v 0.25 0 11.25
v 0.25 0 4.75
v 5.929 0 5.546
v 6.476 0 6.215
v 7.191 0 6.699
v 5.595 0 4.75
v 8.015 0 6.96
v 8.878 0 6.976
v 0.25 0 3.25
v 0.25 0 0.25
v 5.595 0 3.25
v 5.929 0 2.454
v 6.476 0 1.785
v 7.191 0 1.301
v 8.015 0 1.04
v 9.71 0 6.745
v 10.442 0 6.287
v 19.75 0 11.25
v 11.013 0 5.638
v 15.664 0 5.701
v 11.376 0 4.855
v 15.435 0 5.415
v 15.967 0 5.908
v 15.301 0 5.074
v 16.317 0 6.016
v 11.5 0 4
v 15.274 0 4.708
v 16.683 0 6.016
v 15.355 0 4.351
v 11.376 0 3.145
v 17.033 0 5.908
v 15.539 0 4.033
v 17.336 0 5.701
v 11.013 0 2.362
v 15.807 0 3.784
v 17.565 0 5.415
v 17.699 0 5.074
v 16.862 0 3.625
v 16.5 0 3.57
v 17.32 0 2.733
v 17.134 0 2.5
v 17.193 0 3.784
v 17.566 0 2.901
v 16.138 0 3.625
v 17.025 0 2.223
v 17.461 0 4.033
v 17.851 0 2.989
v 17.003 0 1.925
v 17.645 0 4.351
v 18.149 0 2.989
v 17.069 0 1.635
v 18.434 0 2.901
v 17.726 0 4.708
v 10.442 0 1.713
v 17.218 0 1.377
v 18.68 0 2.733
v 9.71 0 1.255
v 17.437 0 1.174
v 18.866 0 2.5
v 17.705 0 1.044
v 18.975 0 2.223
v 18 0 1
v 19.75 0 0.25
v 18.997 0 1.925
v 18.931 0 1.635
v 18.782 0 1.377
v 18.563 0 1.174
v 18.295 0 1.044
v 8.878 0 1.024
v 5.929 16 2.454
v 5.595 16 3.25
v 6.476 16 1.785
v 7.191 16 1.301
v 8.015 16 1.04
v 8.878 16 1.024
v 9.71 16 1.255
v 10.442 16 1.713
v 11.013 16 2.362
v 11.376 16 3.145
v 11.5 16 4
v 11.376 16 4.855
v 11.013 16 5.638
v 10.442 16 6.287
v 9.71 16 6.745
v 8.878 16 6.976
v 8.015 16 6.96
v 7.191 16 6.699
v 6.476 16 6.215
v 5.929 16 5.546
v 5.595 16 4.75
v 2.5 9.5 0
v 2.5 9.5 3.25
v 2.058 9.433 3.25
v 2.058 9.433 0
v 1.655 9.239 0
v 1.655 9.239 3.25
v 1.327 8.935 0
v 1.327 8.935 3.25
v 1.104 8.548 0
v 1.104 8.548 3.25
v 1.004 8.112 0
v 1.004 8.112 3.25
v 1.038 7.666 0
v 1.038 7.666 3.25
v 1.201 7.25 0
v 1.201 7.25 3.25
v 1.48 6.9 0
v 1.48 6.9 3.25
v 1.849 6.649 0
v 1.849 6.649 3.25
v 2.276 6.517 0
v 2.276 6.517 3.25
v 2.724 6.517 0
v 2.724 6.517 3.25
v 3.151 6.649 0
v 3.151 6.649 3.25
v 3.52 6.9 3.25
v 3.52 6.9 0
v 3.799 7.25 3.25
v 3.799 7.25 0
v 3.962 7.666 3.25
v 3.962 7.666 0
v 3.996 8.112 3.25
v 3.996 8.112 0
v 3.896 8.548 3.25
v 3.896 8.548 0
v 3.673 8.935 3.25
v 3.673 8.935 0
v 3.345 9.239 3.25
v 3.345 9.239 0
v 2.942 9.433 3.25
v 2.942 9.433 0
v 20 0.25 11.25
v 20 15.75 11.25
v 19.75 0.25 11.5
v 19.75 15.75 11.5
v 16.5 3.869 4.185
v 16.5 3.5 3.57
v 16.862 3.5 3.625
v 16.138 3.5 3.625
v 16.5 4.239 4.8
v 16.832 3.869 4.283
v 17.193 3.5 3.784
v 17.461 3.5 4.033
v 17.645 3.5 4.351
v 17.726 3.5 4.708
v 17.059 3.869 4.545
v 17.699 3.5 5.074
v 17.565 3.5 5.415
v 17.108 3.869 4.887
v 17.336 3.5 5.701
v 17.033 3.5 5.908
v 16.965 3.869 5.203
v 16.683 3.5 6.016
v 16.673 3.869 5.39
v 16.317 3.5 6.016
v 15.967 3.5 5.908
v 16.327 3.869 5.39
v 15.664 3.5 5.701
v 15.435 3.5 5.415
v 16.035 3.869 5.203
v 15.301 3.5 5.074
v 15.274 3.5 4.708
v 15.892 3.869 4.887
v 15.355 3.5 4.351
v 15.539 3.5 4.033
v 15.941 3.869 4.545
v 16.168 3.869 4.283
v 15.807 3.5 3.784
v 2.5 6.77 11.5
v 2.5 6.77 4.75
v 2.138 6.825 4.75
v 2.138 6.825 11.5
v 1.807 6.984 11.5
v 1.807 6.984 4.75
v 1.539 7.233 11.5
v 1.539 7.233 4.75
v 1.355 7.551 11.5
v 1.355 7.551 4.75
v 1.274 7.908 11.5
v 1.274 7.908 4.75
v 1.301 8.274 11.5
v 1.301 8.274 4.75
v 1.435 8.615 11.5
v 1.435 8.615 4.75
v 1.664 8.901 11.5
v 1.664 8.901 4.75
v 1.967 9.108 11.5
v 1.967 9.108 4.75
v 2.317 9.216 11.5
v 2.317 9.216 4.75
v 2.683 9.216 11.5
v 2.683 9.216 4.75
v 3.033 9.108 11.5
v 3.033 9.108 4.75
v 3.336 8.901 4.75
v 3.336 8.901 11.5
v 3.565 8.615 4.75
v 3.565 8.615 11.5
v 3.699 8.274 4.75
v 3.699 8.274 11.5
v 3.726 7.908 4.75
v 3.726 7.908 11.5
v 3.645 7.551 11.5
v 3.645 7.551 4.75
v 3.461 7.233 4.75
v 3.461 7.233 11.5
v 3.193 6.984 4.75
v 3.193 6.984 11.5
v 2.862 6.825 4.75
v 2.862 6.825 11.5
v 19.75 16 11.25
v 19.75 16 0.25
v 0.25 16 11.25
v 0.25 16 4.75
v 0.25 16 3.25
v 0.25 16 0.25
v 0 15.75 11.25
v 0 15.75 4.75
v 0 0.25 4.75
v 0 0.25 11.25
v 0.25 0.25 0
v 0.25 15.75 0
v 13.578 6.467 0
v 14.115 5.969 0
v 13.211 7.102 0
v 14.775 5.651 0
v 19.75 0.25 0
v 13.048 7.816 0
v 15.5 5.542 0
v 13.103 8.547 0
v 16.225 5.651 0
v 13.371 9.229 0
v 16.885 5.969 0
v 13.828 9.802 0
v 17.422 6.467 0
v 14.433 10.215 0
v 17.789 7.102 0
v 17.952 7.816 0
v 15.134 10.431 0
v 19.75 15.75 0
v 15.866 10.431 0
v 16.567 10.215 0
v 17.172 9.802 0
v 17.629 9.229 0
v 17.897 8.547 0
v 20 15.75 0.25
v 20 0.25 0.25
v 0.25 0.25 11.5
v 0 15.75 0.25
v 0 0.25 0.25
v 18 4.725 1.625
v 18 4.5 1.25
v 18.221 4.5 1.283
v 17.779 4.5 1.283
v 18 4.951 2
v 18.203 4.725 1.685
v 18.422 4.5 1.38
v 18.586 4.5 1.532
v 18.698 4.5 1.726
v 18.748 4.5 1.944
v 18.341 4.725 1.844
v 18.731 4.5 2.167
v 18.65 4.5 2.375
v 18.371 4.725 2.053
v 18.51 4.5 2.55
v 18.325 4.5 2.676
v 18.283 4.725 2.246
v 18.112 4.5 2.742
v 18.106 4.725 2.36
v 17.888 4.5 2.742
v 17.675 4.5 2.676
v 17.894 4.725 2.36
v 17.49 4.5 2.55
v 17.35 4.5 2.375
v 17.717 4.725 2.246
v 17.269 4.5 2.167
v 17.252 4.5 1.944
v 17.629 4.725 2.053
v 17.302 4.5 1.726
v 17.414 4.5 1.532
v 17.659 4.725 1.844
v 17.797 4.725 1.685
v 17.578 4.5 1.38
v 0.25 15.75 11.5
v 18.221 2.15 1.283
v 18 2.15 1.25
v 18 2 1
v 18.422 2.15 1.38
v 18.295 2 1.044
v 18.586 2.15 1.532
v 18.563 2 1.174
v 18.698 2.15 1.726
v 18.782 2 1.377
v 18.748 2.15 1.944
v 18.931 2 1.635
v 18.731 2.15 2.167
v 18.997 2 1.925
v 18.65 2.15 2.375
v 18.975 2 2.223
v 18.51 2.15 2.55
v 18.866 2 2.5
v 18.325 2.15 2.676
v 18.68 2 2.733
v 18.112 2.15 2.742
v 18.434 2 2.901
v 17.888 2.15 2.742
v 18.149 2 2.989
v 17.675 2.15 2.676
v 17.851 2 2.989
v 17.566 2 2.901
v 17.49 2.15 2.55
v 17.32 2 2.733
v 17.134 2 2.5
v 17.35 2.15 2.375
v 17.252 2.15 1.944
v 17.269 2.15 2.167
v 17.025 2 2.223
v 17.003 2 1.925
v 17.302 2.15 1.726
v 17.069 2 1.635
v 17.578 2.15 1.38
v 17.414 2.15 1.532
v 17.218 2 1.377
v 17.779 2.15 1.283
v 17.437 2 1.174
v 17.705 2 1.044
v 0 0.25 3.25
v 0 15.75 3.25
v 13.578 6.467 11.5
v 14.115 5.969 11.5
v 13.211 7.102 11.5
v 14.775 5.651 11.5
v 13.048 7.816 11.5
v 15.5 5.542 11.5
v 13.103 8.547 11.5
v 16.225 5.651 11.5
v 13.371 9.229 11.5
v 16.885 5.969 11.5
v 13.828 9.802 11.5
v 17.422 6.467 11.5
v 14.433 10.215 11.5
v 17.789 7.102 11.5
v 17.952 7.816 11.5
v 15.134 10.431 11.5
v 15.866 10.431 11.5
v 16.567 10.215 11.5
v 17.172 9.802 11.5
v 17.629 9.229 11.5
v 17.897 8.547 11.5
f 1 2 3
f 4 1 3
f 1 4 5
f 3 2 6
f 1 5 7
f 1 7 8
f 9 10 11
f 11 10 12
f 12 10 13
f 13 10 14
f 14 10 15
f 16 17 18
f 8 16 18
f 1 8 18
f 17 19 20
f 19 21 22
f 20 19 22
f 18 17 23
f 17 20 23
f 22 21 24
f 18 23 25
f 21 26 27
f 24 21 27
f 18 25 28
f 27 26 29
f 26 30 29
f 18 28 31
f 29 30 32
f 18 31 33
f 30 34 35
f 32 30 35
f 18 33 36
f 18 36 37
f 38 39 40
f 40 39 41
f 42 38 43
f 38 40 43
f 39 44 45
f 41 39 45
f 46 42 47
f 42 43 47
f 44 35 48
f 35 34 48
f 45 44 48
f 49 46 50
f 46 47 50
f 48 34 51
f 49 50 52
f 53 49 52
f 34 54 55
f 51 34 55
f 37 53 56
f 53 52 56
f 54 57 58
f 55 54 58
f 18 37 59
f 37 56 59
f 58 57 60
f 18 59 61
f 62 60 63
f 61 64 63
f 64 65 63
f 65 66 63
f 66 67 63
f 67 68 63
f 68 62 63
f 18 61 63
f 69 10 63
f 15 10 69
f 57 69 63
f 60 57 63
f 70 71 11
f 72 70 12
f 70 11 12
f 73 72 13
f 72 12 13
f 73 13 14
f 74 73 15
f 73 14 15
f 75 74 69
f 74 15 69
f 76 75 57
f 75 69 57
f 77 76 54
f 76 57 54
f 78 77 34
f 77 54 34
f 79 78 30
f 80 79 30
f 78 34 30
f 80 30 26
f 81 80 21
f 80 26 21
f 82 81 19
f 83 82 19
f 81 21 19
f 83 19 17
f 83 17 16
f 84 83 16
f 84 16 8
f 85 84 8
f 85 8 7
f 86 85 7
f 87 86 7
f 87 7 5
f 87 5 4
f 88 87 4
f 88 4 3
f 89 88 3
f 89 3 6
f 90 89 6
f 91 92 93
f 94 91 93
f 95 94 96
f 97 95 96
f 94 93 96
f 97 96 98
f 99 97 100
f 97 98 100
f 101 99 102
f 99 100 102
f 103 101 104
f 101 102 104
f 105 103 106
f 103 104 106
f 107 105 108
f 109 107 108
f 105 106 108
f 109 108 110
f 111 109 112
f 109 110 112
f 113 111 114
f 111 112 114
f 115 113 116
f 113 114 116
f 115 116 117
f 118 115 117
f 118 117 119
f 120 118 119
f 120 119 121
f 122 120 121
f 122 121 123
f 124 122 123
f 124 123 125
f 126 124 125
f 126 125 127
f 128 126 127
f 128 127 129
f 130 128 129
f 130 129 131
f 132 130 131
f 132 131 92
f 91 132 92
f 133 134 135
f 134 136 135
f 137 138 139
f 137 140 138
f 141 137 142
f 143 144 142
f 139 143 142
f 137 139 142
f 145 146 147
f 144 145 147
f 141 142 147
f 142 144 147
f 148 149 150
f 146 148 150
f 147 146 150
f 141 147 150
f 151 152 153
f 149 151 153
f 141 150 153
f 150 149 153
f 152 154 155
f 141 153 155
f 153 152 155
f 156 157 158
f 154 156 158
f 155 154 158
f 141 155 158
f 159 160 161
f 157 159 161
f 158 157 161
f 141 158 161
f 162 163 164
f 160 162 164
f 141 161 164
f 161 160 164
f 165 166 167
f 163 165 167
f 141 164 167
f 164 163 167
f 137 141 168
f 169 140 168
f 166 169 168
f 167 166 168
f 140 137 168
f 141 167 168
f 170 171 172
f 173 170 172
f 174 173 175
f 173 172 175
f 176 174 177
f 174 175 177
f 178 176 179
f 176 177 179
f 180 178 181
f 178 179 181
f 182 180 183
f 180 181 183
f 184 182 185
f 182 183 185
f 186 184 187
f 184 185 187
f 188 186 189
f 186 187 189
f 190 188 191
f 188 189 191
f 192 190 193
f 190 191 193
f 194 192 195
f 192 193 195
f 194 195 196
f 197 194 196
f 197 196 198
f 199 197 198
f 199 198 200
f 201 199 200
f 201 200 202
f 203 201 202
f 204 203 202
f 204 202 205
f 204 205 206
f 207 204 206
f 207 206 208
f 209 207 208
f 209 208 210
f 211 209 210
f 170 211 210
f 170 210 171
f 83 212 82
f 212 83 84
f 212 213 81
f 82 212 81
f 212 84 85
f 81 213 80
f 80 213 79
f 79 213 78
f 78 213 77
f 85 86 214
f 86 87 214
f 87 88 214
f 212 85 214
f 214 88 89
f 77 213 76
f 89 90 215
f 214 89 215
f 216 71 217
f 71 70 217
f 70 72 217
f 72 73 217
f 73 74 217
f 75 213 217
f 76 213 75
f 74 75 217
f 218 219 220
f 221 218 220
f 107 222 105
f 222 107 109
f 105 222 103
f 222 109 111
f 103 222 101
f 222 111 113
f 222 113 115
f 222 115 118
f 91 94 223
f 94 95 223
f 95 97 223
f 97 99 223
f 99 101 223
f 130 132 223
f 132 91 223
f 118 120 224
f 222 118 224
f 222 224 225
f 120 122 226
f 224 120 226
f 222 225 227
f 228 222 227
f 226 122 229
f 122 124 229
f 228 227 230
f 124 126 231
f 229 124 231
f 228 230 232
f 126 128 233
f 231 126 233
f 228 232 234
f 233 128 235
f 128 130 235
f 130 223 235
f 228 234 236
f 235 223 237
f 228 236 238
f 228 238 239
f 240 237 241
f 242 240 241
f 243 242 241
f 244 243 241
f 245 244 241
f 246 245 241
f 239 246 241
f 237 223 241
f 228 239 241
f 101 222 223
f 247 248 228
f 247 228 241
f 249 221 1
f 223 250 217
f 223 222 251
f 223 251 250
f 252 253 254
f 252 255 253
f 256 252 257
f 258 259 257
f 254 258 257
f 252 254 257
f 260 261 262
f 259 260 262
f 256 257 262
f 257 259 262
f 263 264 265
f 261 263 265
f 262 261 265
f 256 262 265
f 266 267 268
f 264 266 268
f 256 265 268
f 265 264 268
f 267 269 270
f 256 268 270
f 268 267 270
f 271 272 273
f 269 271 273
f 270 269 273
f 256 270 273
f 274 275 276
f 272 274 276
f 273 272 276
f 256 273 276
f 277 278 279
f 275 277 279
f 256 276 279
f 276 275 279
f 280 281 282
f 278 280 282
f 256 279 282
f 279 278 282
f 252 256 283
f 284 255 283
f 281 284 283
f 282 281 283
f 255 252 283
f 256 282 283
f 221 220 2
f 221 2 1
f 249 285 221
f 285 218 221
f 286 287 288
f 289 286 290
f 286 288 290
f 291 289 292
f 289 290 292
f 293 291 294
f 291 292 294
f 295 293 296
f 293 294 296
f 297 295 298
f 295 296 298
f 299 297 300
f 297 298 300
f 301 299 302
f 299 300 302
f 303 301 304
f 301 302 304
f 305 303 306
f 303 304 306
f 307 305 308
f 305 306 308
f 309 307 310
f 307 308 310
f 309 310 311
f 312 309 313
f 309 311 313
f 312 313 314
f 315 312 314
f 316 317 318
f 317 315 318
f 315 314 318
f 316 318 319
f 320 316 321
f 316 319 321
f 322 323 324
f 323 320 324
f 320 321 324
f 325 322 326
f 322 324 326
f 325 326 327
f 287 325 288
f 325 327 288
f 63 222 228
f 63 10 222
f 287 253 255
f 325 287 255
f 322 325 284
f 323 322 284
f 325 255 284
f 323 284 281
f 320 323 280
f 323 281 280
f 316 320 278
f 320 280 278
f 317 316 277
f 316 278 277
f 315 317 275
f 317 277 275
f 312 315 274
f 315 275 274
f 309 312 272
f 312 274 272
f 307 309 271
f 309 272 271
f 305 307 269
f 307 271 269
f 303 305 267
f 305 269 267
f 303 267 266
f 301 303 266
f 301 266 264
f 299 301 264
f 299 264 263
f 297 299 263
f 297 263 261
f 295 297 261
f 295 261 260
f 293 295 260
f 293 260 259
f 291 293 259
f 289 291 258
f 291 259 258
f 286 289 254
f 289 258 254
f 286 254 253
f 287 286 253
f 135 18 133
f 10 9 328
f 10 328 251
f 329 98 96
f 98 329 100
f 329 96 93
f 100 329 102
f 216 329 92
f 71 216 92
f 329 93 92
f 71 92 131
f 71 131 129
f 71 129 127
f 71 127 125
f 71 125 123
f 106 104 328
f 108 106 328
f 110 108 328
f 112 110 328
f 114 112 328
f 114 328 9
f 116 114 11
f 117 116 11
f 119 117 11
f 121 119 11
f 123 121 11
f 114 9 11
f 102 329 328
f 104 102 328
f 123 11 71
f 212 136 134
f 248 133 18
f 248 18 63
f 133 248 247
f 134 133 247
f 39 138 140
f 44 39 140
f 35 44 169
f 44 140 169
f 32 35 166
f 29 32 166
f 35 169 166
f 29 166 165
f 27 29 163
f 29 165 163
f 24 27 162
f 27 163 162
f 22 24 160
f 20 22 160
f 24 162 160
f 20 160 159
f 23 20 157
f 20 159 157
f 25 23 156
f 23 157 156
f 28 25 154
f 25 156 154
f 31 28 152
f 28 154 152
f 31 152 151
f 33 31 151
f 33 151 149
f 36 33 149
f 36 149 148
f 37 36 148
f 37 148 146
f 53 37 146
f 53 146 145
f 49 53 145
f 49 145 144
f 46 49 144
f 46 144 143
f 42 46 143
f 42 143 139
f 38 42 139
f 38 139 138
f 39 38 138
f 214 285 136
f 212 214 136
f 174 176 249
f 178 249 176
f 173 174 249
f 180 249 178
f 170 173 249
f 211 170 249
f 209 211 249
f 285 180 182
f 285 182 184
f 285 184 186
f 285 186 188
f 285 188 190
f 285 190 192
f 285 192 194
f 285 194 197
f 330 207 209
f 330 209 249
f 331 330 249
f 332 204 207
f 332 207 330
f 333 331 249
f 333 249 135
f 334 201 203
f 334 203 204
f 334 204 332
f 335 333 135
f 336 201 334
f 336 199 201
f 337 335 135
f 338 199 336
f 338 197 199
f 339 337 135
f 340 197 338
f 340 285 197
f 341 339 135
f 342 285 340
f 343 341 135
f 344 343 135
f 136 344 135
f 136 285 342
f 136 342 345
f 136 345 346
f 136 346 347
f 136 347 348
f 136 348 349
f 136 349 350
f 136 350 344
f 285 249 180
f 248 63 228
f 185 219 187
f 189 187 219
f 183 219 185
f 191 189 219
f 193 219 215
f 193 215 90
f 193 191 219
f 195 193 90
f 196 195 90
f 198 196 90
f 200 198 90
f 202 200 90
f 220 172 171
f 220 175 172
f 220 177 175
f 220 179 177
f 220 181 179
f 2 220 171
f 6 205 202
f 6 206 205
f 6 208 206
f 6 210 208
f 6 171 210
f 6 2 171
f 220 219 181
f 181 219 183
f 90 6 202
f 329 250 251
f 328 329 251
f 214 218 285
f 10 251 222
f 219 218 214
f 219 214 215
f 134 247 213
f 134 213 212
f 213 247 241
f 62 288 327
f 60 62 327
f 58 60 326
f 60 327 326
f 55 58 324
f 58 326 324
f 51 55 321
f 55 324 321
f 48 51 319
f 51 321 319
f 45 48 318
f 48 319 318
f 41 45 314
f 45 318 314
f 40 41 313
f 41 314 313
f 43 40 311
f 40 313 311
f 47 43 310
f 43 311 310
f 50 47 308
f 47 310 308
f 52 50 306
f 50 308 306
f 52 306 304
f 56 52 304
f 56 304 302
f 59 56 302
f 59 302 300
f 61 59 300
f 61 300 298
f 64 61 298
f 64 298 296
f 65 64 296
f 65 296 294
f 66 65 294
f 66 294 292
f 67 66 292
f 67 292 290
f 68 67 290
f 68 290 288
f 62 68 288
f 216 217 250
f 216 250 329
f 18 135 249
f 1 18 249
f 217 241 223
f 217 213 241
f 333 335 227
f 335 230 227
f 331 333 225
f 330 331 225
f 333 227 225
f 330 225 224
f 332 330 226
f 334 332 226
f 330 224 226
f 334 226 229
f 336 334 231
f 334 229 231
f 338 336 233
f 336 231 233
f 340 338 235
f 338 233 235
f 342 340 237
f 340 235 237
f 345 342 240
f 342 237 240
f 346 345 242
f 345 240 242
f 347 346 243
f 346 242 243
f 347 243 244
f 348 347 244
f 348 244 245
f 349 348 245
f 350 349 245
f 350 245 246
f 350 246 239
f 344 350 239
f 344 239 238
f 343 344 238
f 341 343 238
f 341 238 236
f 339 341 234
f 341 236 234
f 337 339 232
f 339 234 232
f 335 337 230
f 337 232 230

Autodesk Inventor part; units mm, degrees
ref_plane "YZ Plane" through (0, 0, 0) normal (1, 0, 0) x (0, 1, 0)
ref_plane "XZ Plane" through (0, 0, 0) normal (0, 1, 0) x (-1, 0, 0)
ref_plane "XY Plane" through (0, 0, 0) normal (0, 0, 1) x (1, 0, 0)
sketch "Sketch1" plane through (0, 0, 0) normal (0, 0, 1) x (1, 0, 0)
  line L0 (0, 0) -> (20, 0)
  line L1 (20, 0) -> (20, 16)
  line L2 (20, 16) -> (0, 16)
  line L3 (0, 16) -> (0, 0)
  dimension "d0" = 20
  dimension "d1" = 16
extrude "Extrusion1" add sketch "Sketch1" along normal blind 11.5
sketch "Sketch2" plane through (0, 0, 11.5) normal (0, 0, 1) x (1, 0, 0)
  line L0 (20, 0) -> (20, 16) projected
  line L1 (0, 0) -> (20, 0) projected
  point P0 (15.5, 8)
  dimension "d4" = 4.5
  dimension "d5" = 8
hole "Hole1" at (15.5, 8, 11.5) direction (0, 0, -1) diameter 4.917 end through all thread size "M6x1" class "6H" standard "ISO Metric profile"
sketch "Sketch3" plane through (0, 0, 0) normal (0, -1, 0) x (1, 0, 0)
  arc A0 (5.5953, 3.25) -> (5.5953, 4.75) centre (8.5, 4) ccw
  line L0 (0, 0) -> (20, 0) projected
  line L1 (20, 0) -> (20, 11.5) projected
  line L2 (0, 0) -> (0, 11.5) projected
  line L3 (0, 4.75) -> (5.5953, 4.75)
  line L4 (0, 3.25) -> (5.5953, 3.25)
  dimension "d13" = 4
  dimension "d14" = 11.5
  dimension "d15" = 3
  dimension "d16" = 0.75
  dimension "d17" = 0.75
extrude "Extrusion2" cut sketch "Sketch3" against normal through all
sketch "Sketch4" plane through (0, 0, 0) normal (0, -1, 0) x (1, 0, 0)
  line L0 (0, 0) -> (20, 0) projected
  line L1 (20, 0) -> (20, 11.5) projected
  point P0 (16.5, 4.8)
  point P1 (18, 2)
  dimension "d20" = 4.8
  dimension "d21" = 3.5
  dimension "d22" = 2
  dimension "d23" = 2
hole "Hole2" at (16.5, 0, 4.8) direction (0, 1, 0) diameter 2.459 depth 3.5 tip angle 118 thread size "M3x0.5" class "6H" standard "ISO Metric profile"
hole "Hole3" at (18, 0, 2) direction (0, 1, 0) diameter 1.5 depth 4.5 tip angle 118
hole "Hole4" at (18, 0, 2) direction (0, 1, 0) diameter 2 depth 2 tip angle 118
sketch "Sketch5" plane through (0, 0, 11.5) normal (0, 0, 1) x (1, 0, 0)
  line L0 (0, 0) -> (20, 0) projected
  line L1 (20, 0) -> (20, 16) projected
  point P0 (2.5, 8)
  dimension "d45" = 8
  dimension "d46" = 17.5
hole "Hole5" at (2.5, 8, 11.5) direction (0, 0, -1) diameter 2.459 end up to surface thread size "M3x0.5" class "6H" standard "ISO Metric profile"
sketch "Sketch6" plane through (0, 0, 0) normal (0, 0, -1) x (-1, 0, 0)
  circle A0 centre (-2.5, 8) radius 1.2295 projected
  point P0 (0, 0)
hole "Hole6" at (2.5, 8, 0) direction (0, 0, 1) diameter 3 end up to surface
chamfer "Chamfer1" distance 0.25 angle 45 14 edges at (0, 8, 11.5) (0, 16, 8.125) (0, 16, 1.625) (0, 8, 0) (0, 0, 1.625) (0, 0, 8.125) (10, 0, 11.5) (10, 0, 0) (20, 0, 5.75) (20, 8, 11.5) (10, 16, 11.5) (20, 8, 0) (20, 16, 5.75) (10, 16, 0)
equation "\"d17\" = d16"
properties part number "Heat Block" material "Aluminum 6061"
